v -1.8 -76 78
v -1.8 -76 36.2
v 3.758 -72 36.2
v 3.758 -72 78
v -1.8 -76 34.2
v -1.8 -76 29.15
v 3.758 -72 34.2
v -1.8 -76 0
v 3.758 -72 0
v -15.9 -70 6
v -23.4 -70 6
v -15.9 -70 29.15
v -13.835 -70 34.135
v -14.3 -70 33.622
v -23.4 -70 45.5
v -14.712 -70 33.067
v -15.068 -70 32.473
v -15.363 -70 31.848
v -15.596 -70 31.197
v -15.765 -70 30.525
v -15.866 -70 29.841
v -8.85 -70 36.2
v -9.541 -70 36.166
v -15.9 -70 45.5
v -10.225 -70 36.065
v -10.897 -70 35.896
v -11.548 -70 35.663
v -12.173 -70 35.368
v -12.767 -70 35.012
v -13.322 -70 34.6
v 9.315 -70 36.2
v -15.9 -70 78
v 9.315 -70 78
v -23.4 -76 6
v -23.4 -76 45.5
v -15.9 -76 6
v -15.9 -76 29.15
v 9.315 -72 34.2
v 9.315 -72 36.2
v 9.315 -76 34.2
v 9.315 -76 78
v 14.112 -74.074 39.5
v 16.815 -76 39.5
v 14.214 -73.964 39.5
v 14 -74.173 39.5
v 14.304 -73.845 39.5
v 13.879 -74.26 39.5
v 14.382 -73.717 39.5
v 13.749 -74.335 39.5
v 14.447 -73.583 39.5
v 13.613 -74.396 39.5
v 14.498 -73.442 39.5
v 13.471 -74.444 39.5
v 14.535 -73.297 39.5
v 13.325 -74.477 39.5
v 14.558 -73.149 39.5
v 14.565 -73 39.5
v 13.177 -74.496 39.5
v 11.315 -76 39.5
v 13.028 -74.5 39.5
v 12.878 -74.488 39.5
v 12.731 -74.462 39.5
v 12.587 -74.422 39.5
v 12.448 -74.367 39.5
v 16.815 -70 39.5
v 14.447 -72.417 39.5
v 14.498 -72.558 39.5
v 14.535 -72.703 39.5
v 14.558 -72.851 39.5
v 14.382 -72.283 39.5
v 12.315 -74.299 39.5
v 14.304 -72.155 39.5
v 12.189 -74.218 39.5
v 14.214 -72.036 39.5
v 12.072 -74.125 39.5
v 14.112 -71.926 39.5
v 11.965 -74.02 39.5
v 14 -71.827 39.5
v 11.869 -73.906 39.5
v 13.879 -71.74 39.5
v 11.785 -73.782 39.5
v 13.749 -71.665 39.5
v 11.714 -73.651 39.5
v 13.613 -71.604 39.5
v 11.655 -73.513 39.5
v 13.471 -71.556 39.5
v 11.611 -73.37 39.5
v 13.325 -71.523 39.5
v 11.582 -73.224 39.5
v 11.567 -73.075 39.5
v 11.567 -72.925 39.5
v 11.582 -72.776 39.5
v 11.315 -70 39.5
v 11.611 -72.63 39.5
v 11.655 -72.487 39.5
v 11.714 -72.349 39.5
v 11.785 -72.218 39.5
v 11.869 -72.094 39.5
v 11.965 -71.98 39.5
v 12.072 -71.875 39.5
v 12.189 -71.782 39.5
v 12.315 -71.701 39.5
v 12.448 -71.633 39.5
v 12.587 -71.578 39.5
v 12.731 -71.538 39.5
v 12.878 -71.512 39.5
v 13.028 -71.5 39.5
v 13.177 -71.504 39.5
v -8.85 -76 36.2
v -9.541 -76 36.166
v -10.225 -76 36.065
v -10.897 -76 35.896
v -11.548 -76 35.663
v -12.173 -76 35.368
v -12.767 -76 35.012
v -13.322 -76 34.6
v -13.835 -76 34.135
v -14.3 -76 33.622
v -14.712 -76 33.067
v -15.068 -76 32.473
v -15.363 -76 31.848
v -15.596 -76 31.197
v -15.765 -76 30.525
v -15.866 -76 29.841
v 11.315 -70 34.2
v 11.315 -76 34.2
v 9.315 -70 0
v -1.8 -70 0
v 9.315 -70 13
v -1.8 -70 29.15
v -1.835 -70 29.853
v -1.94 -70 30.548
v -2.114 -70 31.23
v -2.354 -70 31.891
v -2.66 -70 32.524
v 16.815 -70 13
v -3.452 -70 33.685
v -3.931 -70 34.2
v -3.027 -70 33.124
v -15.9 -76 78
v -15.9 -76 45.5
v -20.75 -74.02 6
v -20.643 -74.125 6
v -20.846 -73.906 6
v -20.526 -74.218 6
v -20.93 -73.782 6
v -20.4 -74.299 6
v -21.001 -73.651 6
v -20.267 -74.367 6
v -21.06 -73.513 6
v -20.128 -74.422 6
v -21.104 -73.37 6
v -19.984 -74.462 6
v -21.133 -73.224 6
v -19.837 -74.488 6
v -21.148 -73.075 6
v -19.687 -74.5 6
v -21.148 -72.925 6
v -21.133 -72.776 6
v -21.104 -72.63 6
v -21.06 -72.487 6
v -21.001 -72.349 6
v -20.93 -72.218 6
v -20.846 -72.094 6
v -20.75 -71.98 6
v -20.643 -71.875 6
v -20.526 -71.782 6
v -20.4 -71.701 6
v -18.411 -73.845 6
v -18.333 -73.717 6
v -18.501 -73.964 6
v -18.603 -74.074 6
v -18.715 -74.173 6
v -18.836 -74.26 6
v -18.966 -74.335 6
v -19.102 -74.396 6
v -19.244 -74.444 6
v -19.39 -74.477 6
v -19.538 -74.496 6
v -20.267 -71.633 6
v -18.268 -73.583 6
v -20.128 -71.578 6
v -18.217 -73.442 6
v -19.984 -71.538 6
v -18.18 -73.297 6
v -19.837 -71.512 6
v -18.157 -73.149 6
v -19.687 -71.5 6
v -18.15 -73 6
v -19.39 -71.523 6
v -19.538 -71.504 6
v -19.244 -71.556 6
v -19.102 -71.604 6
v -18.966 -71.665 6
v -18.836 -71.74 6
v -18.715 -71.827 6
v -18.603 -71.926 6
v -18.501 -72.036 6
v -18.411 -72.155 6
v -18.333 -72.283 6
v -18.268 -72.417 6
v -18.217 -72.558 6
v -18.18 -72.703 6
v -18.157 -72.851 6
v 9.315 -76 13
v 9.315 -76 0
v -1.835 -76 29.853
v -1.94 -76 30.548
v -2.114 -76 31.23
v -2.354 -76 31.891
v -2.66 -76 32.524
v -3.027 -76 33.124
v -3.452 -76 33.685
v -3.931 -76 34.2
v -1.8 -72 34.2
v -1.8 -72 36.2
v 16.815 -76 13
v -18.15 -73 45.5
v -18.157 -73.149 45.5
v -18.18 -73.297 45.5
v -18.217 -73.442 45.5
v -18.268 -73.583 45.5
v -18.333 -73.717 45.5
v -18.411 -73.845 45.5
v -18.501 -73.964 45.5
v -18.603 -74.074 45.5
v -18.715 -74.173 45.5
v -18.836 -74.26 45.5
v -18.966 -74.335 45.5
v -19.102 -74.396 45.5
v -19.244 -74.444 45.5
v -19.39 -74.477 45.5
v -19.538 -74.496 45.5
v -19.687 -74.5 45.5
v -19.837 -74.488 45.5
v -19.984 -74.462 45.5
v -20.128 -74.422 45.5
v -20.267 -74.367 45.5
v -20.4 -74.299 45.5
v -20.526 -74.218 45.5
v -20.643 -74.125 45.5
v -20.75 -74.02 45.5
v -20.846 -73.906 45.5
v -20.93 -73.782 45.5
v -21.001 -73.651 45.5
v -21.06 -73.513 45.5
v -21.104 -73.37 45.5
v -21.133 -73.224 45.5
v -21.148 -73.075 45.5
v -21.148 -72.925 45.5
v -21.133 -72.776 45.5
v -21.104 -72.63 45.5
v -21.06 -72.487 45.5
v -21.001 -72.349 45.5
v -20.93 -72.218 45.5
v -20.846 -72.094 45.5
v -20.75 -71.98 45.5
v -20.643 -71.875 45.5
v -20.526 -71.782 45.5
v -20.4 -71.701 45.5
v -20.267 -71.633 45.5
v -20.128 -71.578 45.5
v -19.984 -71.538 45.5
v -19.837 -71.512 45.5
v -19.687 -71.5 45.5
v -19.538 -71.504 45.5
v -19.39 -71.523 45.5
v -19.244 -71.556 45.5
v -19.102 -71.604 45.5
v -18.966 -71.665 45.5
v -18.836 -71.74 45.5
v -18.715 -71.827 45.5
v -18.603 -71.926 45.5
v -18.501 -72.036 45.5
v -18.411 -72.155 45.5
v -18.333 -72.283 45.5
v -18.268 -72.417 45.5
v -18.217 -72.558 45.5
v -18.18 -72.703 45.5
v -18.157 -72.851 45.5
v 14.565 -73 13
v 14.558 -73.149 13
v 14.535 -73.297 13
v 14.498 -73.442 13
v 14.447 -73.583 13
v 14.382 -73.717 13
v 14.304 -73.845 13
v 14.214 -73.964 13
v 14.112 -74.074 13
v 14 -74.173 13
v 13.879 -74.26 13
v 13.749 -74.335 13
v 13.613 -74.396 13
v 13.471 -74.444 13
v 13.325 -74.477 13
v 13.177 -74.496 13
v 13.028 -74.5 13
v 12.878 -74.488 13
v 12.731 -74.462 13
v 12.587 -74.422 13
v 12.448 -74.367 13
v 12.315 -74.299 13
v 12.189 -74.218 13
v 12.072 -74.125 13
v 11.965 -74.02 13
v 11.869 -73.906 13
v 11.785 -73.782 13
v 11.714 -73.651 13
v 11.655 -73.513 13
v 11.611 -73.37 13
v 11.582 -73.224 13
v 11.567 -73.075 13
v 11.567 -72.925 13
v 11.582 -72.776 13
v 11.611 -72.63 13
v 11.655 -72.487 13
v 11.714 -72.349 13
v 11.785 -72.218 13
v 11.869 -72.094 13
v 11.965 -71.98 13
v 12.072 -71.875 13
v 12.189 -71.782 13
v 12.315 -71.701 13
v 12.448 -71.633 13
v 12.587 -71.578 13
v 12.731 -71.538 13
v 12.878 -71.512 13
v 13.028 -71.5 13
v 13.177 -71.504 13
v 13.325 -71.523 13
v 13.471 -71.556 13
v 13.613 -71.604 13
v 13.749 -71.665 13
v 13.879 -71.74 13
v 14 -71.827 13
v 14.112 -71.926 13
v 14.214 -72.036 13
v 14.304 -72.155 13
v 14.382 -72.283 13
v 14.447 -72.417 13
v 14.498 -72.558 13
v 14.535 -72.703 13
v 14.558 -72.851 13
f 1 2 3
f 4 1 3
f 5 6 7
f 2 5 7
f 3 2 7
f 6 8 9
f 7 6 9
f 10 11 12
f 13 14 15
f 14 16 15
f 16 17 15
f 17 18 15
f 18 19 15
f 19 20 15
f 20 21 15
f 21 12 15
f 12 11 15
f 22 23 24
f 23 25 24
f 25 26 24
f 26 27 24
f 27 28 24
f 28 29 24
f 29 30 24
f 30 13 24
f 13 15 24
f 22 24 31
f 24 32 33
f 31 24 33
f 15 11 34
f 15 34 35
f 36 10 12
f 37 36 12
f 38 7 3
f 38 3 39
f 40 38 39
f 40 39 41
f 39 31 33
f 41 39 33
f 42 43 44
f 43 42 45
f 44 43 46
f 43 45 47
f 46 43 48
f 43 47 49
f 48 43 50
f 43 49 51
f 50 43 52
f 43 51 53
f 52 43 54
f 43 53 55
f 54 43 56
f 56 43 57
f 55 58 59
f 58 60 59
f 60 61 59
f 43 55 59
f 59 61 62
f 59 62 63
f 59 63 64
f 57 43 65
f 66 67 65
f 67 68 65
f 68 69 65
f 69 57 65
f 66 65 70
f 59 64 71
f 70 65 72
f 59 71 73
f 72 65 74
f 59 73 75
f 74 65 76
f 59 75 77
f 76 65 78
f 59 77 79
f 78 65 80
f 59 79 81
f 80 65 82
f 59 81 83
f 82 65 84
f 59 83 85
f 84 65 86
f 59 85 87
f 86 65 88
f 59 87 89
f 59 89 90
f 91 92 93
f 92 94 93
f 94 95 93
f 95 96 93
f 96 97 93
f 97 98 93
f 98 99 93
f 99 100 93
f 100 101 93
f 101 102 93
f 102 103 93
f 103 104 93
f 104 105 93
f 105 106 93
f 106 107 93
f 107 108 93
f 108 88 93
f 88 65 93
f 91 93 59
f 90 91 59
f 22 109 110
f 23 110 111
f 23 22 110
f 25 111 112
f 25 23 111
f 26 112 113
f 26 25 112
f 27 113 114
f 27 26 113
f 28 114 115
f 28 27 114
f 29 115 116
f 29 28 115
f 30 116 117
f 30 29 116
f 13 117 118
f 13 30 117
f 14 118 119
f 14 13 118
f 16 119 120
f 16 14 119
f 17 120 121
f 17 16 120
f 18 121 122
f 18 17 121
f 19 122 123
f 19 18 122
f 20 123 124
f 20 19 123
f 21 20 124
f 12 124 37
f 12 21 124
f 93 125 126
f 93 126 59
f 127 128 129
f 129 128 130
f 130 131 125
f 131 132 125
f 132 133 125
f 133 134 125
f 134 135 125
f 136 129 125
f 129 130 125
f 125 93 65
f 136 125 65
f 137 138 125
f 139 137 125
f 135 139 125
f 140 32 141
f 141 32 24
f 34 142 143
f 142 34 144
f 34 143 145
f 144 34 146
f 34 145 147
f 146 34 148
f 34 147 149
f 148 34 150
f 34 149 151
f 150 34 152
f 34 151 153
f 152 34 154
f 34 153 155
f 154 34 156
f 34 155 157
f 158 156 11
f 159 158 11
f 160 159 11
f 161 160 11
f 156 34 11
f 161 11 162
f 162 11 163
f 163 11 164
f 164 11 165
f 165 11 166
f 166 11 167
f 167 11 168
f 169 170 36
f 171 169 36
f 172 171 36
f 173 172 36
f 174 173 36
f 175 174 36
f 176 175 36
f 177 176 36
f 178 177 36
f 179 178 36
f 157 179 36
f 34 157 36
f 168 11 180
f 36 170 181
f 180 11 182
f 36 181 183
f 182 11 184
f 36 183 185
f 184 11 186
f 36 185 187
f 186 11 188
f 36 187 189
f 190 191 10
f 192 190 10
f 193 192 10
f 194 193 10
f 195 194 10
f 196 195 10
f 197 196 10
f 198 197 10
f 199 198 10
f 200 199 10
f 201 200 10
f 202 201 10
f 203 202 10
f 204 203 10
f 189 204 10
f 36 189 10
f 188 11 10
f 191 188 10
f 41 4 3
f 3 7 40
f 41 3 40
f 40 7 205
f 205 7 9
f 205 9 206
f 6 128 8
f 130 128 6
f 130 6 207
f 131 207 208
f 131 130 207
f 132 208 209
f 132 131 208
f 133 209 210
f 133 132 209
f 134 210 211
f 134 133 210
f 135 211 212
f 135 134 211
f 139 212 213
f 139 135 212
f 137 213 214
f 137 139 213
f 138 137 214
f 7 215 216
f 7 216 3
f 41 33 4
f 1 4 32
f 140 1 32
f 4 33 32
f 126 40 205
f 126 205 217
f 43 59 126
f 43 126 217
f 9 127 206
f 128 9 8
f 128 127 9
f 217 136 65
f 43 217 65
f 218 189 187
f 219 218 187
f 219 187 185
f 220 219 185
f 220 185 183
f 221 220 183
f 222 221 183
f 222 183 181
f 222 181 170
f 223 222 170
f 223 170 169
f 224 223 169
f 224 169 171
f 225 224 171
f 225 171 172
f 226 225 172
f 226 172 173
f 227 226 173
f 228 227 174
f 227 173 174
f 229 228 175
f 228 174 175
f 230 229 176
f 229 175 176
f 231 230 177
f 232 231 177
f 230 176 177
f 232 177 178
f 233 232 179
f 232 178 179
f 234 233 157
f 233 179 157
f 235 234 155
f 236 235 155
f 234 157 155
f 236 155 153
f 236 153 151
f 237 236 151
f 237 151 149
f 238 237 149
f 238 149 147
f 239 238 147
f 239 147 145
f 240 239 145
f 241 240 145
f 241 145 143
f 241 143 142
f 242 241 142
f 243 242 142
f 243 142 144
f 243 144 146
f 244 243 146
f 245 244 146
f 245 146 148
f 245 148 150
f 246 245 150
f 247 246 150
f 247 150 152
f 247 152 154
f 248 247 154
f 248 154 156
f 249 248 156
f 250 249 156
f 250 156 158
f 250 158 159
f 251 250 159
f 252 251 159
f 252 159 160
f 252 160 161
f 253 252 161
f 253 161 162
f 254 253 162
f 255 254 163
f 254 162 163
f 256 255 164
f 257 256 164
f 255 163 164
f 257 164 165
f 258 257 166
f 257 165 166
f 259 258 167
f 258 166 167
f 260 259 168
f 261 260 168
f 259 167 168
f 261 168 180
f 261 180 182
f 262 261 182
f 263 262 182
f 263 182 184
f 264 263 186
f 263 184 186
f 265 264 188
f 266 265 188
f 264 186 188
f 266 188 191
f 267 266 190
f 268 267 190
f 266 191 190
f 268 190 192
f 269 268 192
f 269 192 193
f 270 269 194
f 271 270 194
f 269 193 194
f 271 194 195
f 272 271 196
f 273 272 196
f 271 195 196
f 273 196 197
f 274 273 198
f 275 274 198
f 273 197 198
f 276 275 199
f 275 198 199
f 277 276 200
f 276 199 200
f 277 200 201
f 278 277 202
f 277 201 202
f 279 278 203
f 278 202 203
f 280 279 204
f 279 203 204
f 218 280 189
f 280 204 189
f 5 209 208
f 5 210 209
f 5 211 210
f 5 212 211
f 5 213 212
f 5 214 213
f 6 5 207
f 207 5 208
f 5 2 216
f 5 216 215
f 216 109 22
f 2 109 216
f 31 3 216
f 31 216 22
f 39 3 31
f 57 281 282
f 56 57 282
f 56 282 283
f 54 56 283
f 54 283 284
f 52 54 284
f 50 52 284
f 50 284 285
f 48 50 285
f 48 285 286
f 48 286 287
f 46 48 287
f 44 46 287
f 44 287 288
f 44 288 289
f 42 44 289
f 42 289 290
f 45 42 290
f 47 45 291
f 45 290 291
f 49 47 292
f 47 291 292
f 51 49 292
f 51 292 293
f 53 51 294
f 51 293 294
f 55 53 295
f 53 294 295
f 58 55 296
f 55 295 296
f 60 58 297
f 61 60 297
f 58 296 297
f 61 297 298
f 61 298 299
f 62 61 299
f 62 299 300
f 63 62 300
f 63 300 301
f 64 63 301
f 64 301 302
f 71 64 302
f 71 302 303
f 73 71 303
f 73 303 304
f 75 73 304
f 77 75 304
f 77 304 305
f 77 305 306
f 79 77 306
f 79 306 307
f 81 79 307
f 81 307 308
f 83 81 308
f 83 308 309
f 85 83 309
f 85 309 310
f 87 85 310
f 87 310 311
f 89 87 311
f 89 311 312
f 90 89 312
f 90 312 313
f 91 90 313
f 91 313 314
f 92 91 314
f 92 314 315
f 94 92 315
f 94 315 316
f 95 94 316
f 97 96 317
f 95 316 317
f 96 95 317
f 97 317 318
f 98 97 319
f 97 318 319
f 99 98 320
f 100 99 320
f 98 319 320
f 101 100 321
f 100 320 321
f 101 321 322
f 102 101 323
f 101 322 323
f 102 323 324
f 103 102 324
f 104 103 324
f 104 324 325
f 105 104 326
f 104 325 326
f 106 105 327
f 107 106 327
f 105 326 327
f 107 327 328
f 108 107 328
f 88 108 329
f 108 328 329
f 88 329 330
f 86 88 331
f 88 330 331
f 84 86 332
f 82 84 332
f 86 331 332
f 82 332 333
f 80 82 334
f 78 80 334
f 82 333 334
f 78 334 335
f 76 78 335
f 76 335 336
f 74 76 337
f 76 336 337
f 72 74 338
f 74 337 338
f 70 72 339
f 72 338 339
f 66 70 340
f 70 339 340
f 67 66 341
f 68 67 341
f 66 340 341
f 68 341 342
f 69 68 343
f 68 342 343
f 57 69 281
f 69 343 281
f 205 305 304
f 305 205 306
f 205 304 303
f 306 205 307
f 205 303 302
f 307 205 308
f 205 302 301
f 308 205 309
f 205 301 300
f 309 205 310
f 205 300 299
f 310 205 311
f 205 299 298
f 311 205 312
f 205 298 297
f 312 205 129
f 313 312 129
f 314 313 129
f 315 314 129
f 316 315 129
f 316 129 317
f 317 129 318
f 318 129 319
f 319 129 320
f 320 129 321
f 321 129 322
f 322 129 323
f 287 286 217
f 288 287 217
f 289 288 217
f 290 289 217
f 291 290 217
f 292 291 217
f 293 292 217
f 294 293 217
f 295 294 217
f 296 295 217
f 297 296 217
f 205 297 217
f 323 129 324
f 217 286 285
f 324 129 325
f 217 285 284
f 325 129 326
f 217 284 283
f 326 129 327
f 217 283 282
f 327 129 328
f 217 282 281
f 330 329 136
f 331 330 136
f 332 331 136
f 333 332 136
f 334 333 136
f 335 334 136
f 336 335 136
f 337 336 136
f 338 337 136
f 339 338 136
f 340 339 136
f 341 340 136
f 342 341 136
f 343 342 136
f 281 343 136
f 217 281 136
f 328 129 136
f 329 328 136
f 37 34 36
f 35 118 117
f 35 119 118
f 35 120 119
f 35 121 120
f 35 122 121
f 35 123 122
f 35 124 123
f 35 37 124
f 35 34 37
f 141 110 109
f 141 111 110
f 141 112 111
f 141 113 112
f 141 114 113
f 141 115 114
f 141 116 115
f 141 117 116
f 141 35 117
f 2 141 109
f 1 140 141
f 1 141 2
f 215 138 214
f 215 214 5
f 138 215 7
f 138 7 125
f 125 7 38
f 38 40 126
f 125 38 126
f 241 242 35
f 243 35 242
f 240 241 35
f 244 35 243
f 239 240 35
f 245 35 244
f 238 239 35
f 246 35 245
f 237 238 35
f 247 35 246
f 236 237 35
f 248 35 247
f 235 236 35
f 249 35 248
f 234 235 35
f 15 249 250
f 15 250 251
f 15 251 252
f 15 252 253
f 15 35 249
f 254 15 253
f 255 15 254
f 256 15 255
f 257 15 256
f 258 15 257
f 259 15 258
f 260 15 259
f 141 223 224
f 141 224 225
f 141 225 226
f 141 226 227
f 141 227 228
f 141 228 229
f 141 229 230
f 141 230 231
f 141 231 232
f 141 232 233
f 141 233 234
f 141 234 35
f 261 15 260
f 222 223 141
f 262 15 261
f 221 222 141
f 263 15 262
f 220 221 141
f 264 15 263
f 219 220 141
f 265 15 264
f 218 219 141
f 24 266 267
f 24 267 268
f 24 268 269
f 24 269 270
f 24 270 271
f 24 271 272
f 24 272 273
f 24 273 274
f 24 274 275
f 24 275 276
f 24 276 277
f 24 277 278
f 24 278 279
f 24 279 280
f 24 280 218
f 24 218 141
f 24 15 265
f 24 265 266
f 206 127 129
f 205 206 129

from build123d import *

# Parameters (mm, degrees)
PAD013_DEPTH    = 6
POCKET007_DEPTH = 78.001
SKETCH019_W     = 2
SKETCH019_H     = 5.3
POCKET008_DEPTH = 6.001
SKETCH020_W     = 11.115
SKETCH020_H     = 2
POCKET009_DEPTH = 2
SKETCH021_R     = 1.5
POCKET010_DEPTH = 72.001
SKETCH022_R     = 1.5
POCKET011_DEPTH = 65.001


with BuildPart() as part:
    # Sketch017 → Pad013 (new body)
    with BuildSketch(Plane.XZ):
        with BuildLine():
            Line((-15.9, 6), (-15.9, 29.15))
            ThreePointArc((-1.8, 29.15), (-8.85, 36.2), (-15.9, 29.15))
            Line((-1.8, 0), (-1.8, 29.15))
            Line((9.315, 0), (-1.8, 0))
            Line((9.315, 0), (9.315, 13))
            Line((9.315, 13), (16.815, 13))
            Line((16.815, 13), (16.815, 39.5))
            Line((16.815, 39.5), (9.315, 39.5))
            Line((9.315, 39.5), (9.315, 78))
            Line((9.315, 78), (-15.9, 78))
            Line((-15.9, 78), (-15.9, 45.5))
            Line((-23.4, 45.5), (-15.9, 45.5))
            Line((-23.4, 6), (-23.4, 45.5))
            Line((-23.4, 6), (-15.9, 6))
        make_face()
    extrude(amount=PAD013_DEPTH)

    # Sketch018 (on Face5 of Pad013) → Pocket007 (cut, through all)
    with BuildSketch(Plane(origin=(0, 0, 0), x_dir=(1, 0, 0), z_dir=(0, 0, -1))):
        Polygon((-1.8, 6), (3.7575, 2), (9.315, 6), align=None)
    extrude(amount=-POCKET007_DEPTH, mode=Mode.SUBTRACT)

    # Sketch019 (on Face5 of Pocket007) → Pocket008 (cut, through all)
    with BuildSketch(Plane.XZ.offset(6)):
        with BuildLine():
            Line((-8.8500001165, 36.2), (-1.8, 36.2))
            Line((-1.8, 36.2), (-1.8, 34.2))
            Line((-1.8, 34.2), (-3.9306504495, 34.2))
            ThreePointArc((-3.9306504495, 34.2), (-6.1948164445, 35.6808881698), (-8.8500001165, 36.2))
        make_face()
        with Locations((10.315, 36.85)):
            Rectangle(SKETCH019_W, SKETCH019_H)
    extrude(amount=-POCKET008_DEPTH, mode=Mode.SUBTRACT)

    # Sketch020 (on Face4 of Pocket008) → Pocket009 (cut)
    with BuildSketch(Plane(origin=(0, 0, 0), x_dir=(1, 0, 0), z_dir=(0, 1, 0))):
        with Locations((3.7575, -35.2)):
            Rectangle(SKETCH020_W, SKETCH020_H)
    extrude(amount=-POCKET009_DEPTH, mode=Mode.SUBTRACT)

    # Sketch021 (on Face1 of Pocket009) → Pocket010 (cut, through all)
    with BuildSketch(Plane(origin=(0, 0, 6), x_dir=(1, 0, 0), z_dir=(0, 0, -1))):
        with Locations((-19.65, 3)):
            Circle(SKETCH021_R)
    extrude(amount=-POCKET010_DEPTH, mode=Mode.SUBTRACT)

    # Sketch022 (on Face31 of Pocket010) → Pocket011 (cut, through all)
    with BuildSketch(Plane(origin=(0, 0, 13), x_dir=(1, 0, 0), z_dir=(0, 0, -1))):
        with Locations((13.065, 3)):
            Circle(SKETCH022_R)
    extrude(amount=-POCKET011_DEPTH, mode=Mode.SUBTRACT)


with BuildPart() as part_1:
    # Body003 placement: moved
    add(part.part.moved(Location((0, -70, 0))))


solid = part_1.part
